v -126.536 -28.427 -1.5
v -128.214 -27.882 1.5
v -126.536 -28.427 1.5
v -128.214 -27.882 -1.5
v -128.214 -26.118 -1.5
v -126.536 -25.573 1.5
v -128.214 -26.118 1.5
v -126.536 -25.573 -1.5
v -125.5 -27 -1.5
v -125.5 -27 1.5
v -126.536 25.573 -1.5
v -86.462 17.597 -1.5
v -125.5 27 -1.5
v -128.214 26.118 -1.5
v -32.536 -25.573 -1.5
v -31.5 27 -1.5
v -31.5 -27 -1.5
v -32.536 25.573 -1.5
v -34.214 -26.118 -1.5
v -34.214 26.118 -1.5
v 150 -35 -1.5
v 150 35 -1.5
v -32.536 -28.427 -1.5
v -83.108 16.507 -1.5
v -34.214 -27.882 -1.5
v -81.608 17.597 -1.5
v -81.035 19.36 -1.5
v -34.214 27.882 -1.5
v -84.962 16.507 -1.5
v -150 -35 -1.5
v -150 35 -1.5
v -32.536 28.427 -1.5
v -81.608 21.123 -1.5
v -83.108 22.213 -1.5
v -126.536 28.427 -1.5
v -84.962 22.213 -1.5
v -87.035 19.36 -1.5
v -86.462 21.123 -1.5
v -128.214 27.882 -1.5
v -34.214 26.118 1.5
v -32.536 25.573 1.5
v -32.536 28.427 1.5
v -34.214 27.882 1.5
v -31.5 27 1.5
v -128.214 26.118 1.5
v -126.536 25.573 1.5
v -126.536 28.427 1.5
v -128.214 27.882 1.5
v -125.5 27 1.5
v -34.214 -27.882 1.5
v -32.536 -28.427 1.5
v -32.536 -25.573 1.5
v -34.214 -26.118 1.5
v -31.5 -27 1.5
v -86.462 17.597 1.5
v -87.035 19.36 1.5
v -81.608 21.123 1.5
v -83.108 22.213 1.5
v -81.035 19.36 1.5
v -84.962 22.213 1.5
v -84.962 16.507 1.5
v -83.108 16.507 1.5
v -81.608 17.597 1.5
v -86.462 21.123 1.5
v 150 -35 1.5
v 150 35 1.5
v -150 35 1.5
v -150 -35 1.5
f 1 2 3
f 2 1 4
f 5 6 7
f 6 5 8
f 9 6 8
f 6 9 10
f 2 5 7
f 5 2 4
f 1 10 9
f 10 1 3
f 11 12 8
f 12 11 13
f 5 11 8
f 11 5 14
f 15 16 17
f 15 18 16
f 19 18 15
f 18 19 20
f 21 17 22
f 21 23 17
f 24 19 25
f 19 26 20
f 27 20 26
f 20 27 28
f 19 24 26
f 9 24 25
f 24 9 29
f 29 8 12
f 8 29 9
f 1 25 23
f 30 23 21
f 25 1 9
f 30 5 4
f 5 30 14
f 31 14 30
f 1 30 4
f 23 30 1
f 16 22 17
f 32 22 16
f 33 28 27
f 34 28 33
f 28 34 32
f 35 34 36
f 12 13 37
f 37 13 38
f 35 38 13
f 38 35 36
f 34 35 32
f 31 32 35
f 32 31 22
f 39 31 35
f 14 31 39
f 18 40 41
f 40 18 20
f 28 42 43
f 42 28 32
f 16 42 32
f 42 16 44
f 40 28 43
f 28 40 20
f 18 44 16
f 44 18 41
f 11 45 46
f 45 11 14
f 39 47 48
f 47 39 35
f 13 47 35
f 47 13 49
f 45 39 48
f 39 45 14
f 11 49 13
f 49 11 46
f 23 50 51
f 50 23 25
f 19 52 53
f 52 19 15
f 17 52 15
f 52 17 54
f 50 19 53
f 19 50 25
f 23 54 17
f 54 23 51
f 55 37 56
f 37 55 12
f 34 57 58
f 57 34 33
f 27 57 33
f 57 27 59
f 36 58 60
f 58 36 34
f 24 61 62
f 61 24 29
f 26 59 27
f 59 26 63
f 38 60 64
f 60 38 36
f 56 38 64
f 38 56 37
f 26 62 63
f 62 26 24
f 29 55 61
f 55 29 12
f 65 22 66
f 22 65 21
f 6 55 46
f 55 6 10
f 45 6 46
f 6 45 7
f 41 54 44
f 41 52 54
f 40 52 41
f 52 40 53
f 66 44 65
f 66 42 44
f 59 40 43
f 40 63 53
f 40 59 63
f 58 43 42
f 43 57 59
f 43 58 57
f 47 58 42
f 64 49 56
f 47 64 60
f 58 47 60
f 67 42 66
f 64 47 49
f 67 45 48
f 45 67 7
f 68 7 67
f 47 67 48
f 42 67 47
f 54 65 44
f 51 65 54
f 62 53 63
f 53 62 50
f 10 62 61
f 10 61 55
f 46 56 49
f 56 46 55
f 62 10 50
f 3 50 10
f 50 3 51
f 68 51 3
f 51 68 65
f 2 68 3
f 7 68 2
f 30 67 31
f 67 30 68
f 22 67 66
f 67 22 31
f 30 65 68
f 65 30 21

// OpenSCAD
t = 3;
w = 300;
h = 70;

pw = 100;
ph = 60;

ts = 1.4;

module hole(thick)
{
    cylinder(t+1, thick/2, thick/2);
}

module pcb()
{
    px = 20;
    py = 5;
    
    translate([px + 3, py + 3])
        hole(3);
    translate([px + pw - 3, py + ph - 3])
        hole(3);
    translate([px + 3, py + ph - 3])
        hole(3);
    translate([px + pw - 3, py + 3])
        hole(3);

	sx = 100.965 - 55;
	sy = 90 - 40.64;

	translate([px + sx, py + sy])
		hole(6);
}

module board()
{
    cube(size = [w, h, t]);
}

module name()
{
	translate([w/2, h/2, 0])
		scale([ts,ts,ts])
			linear_extrude(t+1)
				text("swamp thing", font = "Courier New:style=Bold Italic");
}

translate([-w/2, -h/2, -t/2])
		difference()
		{
			board();
			pcb();
			//name();
		};

//projection(cut = true)    board();
    
